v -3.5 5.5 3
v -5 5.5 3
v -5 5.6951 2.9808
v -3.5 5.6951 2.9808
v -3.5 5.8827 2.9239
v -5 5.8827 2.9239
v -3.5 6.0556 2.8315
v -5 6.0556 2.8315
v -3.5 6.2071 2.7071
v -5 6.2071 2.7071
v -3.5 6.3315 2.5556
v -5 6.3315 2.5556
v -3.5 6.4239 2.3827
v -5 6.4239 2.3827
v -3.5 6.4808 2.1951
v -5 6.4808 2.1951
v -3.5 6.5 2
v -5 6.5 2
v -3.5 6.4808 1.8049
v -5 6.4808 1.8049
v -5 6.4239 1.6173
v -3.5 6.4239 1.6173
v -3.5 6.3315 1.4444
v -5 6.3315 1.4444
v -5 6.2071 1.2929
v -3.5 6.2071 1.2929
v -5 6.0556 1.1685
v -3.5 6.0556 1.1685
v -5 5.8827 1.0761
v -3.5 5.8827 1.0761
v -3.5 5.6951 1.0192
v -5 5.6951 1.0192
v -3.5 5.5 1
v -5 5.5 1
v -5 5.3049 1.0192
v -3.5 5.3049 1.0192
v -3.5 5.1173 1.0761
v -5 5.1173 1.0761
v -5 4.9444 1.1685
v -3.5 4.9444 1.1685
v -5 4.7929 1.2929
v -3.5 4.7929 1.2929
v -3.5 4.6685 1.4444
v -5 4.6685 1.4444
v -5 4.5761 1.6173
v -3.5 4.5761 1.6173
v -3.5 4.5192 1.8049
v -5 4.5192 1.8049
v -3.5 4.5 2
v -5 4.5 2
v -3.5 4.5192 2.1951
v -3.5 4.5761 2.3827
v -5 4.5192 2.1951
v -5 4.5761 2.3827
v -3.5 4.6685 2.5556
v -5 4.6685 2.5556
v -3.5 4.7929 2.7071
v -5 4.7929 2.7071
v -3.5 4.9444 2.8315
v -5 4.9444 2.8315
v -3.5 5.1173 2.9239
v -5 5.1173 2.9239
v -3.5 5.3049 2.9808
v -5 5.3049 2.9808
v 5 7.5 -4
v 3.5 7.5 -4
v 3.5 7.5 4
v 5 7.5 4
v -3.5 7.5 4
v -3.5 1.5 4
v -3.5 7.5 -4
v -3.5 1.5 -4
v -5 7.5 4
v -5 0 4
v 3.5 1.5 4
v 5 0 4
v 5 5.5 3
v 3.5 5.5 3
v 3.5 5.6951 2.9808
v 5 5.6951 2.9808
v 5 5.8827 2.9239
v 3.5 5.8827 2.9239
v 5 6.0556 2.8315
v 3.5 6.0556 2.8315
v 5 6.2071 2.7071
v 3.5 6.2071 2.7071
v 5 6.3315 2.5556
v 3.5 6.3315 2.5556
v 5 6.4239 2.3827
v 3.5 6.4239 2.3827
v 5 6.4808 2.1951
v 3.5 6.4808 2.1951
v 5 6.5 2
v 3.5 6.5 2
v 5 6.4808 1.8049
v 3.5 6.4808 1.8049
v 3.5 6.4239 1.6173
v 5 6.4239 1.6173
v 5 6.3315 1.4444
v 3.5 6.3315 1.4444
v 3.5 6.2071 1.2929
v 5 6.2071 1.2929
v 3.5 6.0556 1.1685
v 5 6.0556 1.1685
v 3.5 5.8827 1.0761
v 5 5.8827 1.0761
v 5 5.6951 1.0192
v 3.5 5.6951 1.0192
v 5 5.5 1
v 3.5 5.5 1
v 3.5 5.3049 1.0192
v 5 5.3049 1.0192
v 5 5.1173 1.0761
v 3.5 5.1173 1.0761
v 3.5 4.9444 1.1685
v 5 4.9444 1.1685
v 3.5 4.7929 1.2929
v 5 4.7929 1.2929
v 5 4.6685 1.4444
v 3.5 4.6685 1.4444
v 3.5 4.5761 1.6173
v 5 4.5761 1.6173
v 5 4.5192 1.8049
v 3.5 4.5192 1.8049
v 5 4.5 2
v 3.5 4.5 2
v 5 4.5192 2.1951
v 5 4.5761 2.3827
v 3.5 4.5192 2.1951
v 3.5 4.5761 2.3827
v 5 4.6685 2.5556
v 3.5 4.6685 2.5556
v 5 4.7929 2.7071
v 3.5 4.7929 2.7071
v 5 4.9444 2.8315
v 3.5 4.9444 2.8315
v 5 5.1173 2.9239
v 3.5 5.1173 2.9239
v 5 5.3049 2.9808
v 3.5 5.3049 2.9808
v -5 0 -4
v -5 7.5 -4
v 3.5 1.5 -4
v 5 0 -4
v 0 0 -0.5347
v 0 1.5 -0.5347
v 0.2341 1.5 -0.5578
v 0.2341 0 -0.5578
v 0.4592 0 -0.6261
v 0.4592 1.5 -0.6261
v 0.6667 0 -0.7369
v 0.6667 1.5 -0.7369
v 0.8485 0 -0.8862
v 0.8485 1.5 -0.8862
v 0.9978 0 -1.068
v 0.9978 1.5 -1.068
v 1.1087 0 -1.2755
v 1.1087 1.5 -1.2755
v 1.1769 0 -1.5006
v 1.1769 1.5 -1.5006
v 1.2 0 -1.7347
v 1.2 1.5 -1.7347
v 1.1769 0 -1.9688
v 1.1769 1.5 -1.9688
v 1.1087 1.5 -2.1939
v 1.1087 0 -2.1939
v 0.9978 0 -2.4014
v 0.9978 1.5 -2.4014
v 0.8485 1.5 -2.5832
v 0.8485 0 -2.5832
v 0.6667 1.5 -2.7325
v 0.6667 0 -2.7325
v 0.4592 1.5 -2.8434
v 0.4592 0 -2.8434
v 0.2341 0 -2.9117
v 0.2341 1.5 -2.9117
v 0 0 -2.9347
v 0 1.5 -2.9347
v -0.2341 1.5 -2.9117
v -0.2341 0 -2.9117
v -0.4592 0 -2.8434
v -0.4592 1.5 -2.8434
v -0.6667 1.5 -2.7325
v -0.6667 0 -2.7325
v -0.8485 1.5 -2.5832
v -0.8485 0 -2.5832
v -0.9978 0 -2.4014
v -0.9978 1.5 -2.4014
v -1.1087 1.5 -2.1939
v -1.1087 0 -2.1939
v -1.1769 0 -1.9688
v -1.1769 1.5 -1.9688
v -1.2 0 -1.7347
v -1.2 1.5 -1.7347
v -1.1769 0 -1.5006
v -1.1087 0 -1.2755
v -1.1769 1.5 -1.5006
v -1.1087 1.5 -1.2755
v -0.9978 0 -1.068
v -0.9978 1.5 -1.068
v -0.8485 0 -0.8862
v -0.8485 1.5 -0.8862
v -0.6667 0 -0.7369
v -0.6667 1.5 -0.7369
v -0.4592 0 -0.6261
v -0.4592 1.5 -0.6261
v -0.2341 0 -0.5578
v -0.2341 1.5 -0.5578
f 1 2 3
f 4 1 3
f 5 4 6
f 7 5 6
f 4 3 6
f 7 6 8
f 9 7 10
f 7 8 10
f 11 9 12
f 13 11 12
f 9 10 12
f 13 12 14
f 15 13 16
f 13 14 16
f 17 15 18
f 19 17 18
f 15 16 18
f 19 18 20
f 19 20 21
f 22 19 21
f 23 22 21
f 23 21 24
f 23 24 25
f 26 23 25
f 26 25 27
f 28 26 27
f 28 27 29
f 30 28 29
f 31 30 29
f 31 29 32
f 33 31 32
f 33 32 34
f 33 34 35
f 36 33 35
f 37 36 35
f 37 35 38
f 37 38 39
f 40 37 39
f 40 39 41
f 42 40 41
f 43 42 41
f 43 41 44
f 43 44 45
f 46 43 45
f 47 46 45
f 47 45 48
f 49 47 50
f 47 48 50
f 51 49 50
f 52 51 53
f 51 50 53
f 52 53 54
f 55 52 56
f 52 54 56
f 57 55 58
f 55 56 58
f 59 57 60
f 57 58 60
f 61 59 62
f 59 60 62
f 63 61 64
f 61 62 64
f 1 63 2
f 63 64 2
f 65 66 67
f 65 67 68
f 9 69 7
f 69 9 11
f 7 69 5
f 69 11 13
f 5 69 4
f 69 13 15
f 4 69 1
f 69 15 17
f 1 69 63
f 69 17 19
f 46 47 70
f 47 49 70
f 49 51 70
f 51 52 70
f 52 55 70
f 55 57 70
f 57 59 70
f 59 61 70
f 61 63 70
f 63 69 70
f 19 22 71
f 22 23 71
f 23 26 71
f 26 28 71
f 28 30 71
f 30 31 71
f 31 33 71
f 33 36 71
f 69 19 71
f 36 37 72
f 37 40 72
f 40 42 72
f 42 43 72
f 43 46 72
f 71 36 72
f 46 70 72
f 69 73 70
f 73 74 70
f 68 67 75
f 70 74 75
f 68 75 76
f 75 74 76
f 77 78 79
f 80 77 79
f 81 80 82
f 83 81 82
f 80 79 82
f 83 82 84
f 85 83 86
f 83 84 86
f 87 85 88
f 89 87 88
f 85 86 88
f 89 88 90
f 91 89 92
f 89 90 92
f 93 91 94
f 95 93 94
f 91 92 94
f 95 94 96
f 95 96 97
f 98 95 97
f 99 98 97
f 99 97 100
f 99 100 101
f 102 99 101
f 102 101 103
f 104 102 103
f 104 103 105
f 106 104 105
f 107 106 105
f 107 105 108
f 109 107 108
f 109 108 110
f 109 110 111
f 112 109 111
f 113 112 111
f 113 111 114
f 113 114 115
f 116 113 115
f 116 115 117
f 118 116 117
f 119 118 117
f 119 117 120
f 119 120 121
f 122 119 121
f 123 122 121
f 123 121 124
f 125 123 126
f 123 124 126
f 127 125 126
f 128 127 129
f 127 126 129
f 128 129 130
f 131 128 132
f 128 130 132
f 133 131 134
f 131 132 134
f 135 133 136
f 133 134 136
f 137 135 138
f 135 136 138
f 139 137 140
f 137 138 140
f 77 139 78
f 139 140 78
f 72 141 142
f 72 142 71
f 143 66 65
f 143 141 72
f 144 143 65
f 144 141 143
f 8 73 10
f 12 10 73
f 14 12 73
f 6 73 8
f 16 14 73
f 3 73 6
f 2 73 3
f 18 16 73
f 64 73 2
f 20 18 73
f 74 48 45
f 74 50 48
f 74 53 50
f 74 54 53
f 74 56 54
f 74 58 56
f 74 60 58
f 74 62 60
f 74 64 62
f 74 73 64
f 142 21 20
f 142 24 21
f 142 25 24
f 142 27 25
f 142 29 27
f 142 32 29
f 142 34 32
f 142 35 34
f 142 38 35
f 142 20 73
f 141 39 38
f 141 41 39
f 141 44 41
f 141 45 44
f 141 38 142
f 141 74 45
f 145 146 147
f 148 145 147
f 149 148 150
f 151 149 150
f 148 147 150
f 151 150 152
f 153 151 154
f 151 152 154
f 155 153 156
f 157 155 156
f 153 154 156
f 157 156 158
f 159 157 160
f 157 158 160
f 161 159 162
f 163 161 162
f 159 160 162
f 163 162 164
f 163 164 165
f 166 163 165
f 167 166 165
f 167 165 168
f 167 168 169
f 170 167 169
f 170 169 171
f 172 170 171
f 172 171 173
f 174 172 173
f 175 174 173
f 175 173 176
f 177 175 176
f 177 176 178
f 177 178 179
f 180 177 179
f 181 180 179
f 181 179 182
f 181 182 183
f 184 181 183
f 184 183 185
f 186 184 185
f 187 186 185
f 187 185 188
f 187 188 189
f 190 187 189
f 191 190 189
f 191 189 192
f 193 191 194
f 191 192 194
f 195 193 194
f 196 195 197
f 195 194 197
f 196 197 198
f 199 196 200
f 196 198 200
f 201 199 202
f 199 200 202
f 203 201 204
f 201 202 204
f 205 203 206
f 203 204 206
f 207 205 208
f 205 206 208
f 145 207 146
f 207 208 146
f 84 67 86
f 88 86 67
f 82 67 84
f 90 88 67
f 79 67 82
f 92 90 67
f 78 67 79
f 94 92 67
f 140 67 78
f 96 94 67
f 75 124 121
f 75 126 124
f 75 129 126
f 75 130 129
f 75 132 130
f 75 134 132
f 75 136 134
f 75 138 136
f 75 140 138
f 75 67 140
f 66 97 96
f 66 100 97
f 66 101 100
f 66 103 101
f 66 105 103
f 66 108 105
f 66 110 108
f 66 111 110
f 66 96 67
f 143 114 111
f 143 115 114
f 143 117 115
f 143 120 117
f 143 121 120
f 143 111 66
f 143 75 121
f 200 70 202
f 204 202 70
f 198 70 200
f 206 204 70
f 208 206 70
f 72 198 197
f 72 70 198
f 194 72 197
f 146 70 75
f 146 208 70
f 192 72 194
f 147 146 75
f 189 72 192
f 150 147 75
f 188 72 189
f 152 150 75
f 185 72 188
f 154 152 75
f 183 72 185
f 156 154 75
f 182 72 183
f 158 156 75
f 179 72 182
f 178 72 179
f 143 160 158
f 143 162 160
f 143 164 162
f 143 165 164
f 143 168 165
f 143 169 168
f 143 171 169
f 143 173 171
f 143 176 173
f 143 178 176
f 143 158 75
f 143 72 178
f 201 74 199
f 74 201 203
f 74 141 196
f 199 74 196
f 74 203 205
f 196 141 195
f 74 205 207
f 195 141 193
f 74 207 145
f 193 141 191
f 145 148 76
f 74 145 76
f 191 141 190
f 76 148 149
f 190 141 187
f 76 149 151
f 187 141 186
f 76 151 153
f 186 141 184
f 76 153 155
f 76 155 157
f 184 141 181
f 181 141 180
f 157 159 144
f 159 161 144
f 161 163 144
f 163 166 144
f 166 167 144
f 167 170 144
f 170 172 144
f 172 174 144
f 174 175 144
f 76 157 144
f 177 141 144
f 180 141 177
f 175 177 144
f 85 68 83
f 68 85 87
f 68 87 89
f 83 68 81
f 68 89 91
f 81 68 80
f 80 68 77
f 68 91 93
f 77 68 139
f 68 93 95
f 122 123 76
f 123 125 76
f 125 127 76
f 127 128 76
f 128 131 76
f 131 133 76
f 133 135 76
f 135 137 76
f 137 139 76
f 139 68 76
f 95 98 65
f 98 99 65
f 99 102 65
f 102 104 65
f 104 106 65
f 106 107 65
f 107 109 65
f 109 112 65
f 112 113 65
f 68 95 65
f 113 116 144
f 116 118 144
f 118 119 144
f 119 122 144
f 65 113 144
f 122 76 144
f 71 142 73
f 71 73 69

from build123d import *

# Parameters (mm, degrees)
SKETCH1_W           = 10
SKETCH1_H           = 8
BOSS_EXTRUDE1_DEPTH = 1.5
SKETCH3_W           = 1.5
SKETCH3_H           = 8
BOSS_EXTRUDE2_DEPTH = 6
SKETCH4_R           = 1.2
CUT_EXTRUDE1_DEPTH  = 9.774964387
SKETCH5_R           = 1
CUT_EXTRUDE2_DEPTH  = 14.124404748


with BuildPart() as part:
    # Sketch1 → Boss-Extrude1 (new body)
    with BuildSketch(Plane(origin=(0, 0, 0), x_dir=(1, 0, 0), z_dir=(0, 1, 0))):
        Rectangle(SKETCH1_W, SKETCH1_H)
    extrude(amount=BOSS_EXTRUDE1_DEPTH)

    # Sketch3 → Boss-Extrude2 (add)
    with BuildSketch(Plane(origin=(0, 1.5, 0), x_dir=(1, 0, 0), z_dir=(0, 1, 0))):
        with Locations((-4.25, 0)):
            Rectangle(SKETCH3_W, SKETCH3_H)
        with Locations((4.25, 0)):
            Rectangle(SKETCH3_W, SKETCH3_H)
    extrude(amount=BOSS_EXTRUDE2_DEPTH)

    # Sketch4 → Cut-Extrude1 (cut, through all)
    with BuildSketch(Plane(origin=(0, 1.5, 0), x_dir=(1, 0, 0), z_dir=(0, 1, 0))):
        with Locations(Location((0, 1.734711092, 0), (0, 0, 270))):
            Circle(SKETCH4_R)
    extrude(amount=-CUT_EXTRUDE1_DEPTH, mode=Mode.SUBTRACT)

    # Sketch5 → Cut-Extrude2 (cut, through all)
    with BuildSketch(Plane.ZY.offset(5)):
        with Locations((2, 5.5)):
            Circle(SKETCH5_R)
    extrude(amount=-CUT_EXTRUDE2_DEPTH, mode=Mode.SUBTRACT)


solid = part.part
